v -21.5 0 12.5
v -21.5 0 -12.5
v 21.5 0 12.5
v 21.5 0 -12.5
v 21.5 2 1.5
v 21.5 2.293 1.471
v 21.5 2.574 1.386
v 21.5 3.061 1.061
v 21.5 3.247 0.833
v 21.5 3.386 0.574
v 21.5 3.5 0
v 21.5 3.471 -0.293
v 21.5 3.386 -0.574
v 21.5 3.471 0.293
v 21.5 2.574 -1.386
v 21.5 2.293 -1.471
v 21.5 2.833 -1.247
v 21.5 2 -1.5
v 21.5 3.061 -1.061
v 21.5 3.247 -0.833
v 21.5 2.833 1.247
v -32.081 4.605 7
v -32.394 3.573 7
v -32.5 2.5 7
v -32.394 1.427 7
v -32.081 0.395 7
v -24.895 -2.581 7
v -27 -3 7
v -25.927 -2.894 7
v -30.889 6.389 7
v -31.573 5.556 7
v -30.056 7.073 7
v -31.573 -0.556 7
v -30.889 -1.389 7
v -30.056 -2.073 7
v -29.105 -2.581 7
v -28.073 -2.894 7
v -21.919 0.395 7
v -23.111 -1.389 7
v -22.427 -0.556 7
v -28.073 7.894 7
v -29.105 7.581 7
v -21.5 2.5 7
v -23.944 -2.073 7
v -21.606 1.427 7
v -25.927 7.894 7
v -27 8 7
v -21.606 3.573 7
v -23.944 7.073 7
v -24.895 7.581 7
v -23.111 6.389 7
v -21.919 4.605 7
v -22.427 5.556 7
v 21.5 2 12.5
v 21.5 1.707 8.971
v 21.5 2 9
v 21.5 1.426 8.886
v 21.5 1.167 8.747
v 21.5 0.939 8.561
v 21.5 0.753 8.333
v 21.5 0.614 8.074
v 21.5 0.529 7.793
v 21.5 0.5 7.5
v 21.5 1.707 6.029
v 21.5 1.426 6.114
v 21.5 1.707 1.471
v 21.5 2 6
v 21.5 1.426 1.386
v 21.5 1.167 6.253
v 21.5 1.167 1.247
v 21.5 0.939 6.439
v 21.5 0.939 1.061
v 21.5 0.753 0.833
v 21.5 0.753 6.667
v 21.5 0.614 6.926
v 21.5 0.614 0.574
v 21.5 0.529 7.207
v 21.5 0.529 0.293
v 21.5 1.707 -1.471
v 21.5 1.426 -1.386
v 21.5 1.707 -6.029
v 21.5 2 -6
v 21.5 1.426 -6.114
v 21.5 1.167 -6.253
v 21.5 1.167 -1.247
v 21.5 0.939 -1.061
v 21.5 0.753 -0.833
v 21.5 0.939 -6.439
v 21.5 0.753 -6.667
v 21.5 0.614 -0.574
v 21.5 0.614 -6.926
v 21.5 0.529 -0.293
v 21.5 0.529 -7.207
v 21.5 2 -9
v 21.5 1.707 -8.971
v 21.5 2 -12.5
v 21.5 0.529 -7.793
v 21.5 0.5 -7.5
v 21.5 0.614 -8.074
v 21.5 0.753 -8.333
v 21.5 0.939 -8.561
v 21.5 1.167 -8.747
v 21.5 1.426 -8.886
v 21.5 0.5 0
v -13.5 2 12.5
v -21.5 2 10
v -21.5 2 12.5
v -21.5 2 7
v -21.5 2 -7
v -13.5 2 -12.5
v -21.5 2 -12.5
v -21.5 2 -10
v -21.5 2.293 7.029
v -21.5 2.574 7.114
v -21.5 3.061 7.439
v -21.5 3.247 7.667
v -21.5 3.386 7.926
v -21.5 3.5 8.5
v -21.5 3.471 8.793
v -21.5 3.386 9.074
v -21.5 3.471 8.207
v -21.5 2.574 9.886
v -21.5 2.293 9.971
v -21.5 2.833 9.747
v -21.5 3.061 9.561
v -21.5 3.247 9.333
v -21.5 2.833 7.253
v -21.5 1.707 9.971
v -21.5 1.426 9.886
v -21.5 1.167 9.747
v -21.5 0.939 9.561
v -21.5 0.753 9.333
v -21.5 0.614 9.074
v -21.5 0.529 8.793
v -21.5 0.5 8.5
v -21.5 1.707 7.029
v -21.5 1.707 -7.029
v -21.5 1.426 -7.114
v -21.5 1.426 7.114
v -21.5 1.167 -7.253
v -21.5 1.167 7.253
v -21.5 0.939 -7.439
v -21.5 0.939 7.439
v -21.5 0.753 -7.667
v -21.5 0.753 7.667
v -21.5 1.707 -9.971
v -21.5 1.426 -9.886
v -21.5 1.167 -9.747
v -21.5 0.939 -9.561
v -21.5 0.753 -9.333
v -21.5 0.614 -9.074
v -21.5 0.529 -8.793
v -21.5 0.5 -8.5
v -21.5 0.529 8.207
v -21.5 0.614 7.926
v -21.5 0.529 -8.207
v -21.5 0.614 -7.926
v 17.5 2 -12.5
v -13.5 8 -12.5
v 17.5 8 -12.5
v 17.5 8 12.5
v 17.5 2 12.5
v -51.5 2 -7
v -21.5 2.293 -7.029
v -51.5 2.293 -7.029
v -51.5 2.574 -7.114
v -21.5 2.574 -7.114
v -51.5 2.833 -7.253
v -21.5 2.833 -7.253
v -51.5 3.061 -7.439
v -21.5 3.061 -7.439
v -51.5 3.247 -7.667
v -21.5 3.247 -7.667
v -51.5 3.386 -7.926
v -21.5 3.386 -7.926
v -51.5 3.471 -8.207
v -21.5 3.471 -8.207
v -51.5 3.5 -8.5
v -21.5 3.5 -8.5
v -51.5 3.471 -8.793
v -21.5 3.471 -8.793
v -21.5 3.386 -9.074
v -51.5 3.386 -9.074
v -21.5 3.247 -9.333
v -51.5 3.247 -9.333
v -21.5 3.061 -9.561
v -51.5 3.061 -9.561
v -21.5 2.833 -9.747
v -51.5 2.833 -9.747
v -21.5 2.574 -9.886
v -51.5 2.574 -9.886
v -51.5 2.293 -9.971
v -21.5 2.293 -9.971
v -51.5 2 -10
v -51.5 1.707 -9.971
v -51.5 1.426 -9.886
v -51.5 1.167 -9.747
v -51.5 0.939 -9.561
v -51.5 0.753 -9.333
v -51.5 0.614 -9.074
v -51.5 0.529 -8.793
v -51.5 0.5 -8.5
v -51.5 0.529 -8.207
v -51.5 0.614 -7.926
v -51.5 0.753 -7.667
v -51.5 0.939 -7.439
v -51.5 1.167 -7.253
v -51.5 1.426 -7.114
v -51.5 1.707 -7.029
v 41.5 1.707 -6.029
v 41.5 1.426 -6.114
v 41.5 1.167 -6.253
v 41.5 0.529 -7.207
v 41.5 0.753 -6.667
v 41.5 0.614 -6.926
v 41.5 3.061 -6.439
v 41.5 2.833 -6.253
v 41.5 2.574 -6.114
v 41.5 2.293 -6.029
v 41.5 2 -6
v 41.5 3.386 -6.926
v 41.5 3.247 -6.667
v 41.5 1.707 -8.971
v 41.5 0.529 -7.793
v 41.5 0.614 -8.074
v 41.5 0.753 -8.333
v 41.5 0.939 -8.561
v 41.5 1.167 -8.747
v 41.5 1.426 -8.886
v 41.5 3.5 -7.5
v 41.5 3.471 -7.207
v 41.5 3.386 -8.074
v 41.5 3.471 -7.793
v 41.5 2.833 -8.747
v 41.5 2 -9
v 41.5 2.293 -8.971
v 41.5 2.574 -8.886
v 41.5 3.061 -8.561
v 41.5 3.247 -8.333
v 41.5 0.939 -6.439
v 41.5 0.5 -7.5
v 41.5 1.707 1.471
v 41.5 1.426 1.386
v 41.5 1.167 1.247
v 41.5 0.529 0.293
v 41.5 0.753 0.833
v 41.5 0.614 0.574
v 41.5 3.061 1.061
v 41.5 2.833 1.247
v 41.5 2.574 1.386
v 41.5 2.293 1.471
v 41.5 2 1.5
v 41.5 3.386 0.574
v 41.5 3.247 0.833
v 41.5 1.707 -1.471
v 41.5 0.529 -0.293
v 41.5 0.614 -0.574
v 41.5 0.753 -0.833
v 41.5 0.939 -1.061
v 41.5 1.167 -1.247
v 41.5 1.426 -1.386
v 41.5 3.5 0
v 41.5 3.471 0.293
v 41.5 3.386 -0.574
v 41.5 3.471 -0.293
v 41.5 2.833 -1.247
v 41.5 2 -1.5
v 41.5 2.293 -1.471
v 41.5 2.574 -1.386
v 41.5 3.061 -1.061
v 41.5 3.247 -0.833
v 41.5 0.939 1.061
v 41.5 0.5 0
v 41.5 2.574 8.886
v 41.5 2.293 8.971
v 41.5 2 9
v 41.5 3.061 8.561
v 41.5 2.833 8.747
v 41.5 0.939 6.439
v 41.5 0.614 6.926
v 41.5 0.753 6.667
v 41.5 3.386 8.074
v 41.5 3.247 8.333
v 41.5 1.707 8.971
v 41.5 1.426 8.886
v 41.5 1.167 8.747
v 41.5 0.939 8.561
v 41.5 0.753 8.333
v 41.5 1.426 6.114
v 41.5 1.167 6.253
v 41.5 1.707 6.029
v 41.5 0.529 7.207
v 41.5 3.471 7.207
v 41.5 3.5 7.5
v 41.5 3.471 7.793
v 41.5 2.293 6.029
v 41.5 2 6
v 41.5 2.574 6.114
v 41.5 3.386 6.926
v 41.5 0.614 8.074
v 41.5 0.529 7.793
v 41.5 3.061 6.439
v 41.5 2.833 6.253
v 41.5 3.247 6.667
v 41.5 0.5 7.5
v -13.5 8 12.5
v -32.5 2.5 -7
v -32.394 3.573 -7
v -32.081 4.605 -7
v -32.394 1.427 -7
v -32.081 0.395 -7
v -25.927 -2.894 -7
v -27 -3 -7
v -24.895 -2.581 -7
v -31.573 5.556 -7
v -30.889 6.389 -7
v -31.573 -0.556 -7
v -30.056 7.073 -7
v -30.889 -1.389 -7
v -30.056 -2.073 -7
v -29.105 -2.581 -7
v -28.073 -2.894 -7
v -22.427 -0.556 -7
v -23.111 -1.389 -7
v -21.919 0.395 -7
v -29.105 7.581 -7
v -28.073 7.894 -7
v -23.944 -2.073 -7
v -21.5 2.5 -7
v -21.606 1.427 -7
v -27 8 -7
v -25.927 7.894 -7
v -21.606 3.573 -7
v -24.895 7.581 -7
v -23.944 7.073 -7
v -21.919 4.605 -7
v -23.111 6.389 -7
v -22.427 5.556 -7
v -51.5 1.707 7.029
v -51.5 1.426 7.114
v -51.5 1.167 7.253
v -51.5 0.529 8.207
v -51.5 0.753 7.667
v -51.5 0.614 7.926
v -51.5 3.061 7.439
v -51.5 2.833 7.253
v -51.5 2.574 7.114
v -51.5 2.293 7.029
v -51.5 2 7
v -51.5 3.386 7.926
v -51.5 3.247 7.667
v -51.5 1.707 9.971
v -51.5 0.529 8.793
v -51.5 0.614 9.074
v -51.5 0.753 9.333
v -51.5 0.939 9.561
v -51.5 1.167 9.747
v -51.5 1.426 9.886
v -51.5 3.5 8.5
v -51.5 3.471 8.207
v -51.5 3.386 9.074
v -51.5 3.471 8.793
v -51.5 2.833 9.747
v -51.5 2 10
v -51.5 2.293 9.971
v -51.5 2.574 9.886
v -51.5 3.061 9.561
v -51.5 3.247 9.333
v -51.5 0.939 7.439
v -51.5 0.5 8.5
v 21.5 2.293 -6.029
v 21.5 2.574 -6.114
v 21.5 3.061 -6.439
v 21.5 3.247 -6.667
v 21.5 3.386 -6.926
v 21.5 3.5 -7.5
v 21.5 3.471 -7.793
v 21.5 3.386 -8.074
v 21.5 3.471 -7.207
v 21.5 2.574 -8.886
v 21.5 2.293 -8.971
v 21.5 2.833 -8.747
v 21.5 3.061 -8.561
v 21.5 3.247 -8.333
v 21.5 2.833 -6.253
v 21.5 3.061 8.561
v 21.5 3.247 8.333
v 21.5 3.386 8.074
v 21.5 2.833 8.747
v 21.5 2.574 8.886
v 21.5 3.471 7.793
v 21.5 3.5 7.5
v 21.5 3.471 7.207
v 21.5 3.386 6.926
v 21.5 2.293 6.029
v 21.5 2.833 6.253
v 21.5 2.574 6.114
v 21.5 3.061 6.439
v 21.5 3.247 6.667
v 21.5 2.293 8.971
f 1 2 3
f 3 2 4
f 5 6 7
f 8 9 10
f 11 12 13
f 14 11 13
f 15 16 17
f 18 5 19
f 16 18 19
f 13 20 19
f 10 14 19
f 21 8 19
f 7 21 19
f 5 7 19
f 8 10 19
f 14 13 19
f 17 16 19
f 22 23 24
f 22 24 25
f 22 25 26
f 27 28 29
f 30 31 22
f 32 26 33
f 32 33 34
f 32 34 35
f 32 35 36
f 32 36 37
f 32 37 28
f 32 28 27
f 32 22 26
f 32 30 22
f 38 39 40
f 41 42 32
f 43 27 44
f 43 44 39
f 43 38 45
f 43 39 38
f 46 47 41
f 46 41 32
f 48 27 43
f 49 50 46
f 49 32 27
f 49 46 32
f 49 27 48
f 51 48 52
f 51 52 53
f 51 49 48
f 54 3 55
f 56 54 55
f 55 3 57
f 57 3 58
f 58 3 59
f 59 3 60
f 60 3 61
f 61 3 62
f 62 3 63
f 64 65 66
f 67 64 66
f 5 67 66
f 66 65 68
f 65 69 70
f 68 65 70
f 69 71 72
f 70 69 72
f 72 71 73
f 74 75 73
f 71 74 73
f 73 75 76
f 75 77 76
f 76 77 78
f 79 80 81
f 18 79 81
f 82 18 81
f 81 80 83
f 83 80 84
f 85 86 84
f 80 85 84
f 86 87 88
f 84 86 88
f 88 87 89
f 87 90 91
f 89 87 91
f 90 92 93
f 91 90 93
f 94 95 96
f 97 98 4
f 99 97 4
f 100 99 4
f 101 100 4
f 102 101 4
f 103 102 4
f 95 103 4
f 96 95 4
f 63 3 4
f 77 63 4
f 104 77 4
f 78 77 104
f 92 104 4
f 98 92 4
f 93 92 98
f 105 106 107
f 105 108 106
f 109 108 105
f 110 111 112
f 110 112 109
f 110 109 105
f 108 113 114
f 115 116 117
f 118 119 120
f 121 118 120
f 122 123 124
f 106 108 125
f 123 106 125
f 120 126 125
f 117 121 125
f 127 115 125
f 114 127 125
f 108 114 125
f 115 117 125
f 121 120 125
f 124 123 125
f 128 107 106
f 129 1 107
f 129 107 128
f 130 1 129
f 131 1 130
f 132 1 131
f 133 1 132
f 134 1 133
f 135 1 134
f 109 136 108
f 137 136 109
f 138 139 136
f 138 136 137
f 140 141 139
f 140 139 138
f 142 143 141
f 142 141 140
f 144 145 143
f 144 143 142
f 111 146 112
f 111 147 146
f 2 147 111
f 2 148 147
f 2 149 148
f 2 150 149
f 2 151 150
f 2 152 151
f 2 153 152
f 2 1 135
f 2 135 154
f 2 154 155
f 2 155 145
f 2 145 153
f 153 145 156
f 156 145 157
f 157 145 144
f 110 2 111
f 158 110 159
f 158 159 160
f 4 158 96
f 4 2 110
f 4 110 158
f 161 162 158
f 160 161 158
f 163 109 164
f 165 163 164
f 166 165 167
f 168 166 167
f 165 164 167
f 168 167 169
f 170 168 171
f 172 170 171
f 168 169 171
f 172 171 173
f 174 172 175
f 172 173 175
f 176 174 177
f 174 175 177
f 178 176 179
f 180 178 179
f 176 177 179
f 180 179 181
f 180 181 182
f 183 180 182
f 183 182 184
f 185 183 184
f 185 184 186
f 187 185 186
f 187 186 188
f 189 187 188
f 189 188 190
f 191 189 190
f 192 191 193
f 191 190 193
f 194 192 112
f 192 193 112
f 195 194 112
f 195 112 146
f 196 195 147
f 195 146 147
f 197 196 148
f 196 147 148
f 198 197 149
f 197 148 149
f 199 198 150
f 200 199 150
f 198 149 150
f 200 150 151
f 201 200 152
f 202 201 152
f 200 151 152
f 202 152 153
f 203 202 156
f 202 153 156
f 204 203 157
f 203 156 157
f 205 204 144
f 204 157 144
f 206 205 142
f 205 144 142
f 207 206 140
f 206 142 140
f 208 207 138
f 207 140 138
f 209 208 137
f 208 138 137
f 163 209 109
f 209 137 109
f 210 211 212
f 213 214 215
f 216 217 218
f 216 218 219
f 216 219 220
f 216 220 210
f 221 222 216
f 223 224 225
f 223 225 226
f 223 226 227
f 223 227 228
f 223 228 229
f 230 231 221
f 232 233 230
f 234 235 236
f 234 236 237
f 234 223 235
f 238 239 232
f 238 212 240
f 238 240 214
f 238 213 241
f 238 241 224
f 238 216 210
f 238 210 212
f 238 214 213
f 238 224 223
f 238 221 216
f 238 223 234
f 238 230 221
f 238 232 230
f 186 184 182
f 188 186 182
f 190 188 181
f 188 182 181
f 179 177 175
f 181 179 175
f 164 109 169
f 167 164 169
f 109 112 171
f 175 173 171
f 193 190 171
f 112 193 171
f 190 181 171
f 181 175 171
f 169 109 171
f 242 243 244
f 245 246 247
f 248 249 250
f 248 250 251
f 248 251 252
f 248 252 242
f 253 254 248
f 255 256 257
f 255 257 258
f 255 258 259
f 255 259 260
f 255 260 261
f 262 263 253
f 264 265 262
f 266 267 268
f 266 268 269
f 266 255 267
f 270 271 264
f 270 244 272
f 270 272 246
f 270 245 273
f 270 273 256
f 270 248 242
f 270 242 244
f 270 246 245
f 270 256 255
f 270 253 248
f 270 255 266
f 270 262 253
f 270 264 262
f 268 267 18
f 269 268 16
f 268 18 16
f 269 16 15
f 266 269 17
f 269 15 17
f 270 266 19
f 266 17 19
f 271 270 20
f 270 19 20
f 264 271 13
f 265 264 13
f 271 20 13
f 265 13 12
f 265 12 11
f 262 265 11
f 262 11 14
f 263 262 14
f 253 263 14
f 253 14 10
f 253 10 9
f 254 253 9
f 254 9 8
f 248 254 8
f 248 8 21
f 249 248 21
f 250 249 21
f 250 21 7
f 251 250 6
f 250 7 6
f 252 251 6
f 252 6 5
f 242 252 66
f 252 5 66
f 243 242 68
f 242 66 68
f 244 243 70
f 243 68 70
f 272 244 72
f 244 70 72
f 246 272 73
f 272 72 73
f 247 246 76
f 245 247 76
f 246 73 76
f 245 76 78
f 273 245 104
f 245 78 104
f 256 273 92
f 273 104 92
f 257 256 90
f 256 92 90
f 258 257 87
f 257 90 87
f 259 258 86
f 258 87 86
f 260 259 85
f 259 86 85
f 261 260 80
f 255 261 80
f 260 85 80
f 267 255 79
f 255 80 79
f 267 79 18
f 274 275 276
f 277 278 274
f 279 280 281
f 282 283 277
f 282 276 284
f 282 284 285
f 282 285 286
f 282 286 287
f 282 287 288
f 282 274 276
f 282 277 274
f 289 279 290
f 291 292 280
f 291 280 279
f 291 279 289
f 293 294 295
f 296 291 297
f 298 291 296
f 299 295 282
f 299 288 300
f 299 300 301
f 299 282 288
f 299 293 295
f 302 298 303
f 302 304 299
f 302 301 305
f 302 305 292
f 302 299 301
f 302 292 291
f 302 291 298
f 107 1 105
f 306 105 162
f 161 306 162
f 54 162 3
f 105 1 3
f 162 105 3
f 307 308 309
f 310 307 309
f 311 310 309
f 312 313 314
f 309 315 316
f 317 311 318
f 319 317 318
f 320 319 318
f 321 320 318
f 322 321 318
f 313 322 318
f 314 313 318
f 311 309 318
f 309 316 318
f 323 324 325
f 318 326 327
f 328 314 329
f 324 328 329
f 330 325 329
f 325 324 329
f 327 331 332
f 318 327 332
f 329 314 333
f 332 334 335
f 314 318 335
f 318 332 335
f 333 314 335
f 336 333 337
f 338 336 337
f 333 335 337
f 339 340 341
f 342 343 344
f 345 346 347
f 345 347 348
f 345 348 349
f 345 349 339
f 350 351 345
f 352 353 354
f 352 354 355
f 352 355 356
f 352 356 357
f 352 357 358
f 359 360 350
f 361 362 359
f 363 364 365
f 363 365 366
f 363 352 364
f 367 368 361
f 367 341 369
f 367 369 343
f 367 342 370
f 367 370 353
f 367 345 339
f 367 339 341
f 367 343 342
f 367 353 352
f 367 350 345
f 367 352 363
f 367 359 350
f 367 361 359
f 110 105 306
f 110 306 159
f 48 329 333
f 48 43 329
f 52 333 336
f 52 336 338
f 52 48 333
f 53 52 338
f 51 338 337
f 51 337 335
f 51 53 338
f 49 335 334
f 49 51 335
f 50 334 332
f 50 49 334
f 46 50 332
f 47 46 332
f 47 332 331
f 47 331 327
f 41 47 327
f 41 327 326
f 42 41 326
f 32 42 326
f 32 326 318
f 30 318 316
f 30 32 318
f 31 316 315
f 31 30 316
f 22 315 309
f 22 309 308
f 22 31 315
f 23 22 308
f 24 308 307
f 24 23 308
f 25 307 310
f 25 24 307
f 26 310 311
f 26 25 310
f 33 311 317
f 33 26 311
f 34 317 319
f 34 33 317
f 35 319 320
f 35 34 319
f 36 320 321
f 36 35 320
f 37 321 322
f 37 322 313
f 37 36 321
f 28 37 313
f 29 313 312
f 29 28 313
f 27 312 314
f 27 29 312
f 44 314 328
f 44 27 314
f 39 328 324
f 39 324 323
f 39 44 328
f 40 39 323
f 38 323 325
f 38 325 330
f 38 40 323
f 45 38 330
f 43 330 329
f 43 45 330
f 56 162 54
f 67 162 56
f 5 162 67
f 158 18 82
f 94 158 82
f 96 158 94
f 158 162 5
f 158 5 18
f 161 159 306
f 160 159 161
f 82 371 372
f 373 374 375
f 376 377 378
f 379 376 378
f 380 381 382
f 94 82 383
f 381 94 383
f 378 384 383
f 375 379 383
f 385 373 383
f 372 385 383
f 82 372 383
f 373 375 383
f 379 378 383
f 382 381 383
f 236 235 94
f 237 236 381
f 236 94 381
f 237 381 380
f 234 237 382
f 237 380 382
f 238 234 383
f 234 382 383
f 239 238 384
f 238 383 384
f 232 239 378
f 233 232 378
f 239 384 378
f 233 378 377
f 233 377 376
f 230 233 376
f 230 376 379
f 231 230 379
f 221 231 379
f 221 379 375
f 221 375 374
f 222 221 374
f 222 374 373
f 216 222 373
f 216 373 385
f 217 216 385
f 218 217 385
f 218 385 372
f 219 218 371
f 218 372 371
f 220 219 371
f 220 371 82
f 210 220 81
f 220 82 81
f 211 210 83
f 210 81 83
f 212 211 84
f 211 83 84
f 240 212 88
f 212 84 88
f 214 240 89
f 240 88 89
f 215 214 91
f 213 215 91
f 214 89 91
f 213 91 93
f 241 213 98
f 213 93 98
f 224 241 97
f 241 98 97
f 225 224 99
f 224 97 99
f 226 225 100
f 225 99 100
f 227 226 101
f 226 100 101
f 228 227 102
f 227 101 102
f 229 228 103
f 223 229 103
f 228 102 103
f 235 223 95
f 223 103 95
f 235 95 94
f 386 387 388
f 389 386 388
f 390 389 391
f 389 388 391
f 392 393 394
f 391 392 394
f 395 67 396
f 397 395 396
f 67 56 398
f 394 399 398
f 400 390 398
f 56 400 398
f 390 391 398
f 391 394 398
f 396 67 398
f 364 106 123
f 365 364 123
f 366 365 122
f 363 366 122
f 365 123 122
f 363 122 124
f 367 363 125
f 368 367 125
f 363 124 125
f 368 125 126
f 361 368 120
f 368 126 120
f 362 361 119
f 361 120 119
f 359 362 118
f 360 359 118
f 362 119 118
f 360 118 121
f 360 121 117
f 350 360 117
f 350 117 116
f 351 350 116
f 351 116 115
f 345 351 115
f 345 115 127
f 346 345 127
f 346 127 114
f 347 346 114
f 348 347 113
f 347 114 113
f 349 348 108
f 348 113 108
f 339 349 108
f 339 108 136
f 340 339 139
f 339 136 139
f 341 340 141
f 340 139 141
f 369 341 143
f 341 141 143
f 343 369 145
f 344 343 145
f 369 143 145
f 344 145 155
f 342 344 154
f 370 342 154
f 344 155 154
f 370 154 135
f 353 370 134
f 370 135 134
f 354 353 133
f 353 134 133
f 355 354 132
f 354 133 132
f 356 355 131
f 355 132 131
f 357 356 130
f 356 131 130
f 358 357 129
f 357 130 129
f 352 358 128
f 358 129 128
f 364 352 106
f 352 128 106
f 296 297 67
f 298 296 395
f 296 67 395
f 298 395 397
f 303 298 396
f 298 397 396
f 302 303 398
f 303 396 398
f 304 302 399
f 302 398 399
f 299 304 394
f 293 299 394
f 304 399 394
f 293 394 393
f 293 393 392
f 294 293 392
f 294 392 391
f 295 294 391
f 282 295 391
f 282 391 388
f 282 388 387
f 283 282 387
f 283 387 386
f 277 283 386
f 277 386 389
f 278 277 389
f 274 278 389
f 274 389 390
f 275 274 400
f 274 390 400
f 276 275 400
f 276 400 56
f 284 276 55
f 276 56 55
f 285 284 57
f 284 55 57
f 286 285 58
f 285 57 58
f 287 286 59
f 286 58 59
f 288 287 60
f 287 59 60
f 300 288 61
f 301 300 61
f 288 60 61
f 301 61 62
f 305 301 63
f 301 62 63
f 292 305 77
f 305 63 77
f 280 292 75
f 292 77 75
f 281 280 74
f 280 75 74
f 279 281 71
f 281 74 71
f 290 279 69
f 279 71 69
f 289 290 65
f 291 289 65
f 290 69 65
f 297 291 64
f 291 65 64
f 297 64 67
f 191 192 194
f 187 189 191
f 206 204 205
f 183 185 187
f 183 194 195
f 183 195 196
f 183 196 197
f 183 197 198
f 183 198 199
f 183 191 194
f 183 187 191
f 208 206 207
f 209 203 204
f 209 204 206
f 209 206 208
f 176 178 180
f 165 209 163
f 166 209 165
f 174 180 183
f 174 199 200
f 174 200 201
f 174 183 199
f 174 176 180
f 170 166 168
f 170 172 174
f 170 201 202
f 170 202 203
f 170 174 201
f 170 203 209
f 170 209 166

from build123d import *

# Parameters (mm, degrees)
SKETCH1_W           = 43
SKETCH1_H           = 25
BOSS_EXTRUDE1_DEPTH = 2
SKETCH2_R           = 5.5
BOSS_EXTRUDE2_DEPTH = 7
SKETCH3_W           = 31
SKETCH3_H           = 25
BOSS_EXTRUDE3_DEPTH = 6
SKETCH4_R           = 1.5
BOSS_EXTRUDE4_DEPTH = 30
SKETCH5_R           = 1.5
BOSS_EXTRUDE5_DEPTH = 20


with BuildPart() as part:
    # Sketch1 → Boss-Extrude1 (new body)
    with BuildSketch(Plane(origin=(0, 0, 0), x_dir=(1, 0, 0), z_dir=(0, 1, 0))):
        Rectangle(SKETCH1_W, SKETCH1_H)
    extrude(amount=BOSS_EXTRUDE1_DEPTH)

    # Sketch3 → Boss-Extrude3 (add)
    with BuildSketch(Plane(origin=(0, 2, 0), x_dir=(1, 0, 0), z_dir=(0, 1, 0))):
        with Locations((2, 0)):
            Rectangle(SKETCH3_W, SKETCH3_H)
    extrude(amount=BOSS_EXTRUDE3_DEPTH)

    # Sketch4 → Boss-Extrude4 (add)
    with BuildSketch(Plane.ZY.offset(21.5)):
        with Locations((-8.5, 2)):
            Circle(SKETCH4_R)
        with Locations((8.5, 2)):
            Circle(SKETCH4_R)
    extrude(amount=BOSS_EXTRUDE4_DEPTH)

    # Sketch5 → Boss-Extrude5 (add)
    with BuildSketch(Plane(origin=(21.5, 0, 0), x_dir=(0, 0, -1), z_dir=(1, 0, 0))):
        with Locations((-7.5, 2)):
            Circle(SKETCH5_R)
        with Locations((0, 2)):
            Circle(SKETCH5_R)
        with Locations((7.5, 2)):
            Circle(SKETCH5_R)
    extrude(amount=BOSS_EXTRUDE5_DEPTH)


with BuildPart() as body_2:
    # Sketch2 → Boss-Extrude2 (new body, symmetric)
    with BuildSketch(Plane.XY):
        with Locations((-27, 2.5)):
            Circle(SKETCH2_R)
    extrude(amount=BOSS_EXTRUDE2_DEPTH, both=True)


solid = Compound([part.part, body_2.part])
